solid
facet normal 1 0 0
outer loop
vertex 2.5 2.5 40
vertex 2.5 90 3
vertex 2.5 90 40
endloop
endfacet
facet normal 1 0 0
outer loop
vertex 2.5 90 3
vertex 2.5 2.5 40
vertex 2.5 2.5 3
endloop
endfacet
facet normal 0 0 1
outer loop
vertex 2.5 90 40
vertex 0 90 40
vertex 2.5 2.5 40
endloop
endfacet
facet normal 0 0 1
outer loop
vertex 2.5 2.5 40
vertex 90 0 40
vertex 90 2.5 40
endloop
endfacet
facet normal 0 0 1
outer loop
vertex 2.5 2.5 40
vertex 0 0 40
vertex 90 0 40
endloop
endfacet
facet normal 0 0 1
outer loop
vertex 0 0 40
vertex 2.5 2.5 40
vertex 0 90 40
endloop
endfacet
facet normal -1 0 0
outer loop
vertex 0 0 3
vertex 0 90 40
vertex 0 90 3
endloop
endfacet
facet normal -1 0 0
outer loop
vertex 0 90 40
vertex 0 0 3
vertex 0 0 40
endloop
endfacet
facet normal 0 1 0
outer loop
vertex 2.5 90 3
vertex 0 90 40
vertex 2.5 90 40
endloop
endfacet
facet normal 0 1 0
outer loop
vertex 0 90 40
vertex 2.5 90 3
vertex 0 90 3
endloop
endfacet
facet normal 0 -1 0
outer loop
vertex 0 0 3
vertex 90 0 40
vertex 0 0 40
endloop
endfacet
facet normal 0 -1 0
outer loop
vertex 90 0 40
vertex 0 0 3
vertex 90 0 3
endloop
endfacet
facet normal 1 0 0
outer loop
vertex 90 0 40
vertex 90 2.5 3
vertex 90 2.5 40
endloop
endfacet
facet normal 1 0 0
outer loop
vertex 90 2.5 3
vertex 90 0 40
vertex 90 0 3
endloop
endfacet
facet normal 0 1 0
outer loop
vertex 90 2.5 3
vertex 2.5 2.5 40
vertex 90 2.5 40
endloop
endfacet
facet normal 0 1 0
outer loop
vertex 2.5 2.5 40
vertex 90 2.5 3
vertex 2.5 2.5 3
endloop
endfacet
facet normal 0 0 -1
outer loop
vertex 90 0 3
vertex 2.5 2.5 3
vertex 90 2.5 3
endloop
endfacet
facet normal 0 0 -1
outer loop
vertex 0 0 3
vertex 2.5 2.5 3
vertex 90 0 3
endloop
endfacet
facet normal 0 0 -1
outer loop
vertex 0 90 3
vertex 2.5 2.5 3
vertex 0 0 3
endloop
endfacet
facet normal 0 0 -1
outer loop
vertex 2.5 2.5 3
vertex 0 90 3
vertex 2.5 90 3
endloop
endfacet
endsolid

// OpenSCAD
// Fan box - a top plate and four walls, open at the top, to house a PC case fan as a
// magnetic stirrer. NOVEL general part.
//

top     = 90;
length  = 90;
height  = 40;
wall    = 2.5;
screw   = 4.5;
cable   = 12;

$fn = 48;

plate_t = 2;

difference() {
    union() {
        cube([top, length, plate_t]);                                              // top plate
        for (x = [-top / 2 - wall / 2, top / 2 + wall / 2])
            cube([wall, length, height], p = [x, 0, 0]);                           // left/right walls
        for (y = [-length / 2 - wall / 2, length / 2 + wall / 2])
            cube([top, wall, height], p = [0, y, 0]);                              // front/back walls
    }
    translate([0, 0, -1]) cube([top, length, plate_t + 2]);                        // pocket the fan through the plate
    for (x = [-71.5 / 2 / 2, 71.5 / 2 / 2], y = [-71.5 / 2 / 2, 71.5 / 2 / 2])
        translate([x, y, -1]) cylinder(h = plate_t + 2, d = screw);                 // screw holes
    // cable notch in the +y wall (right wall), centre d, reaching 8 mm down from the open edge
    translate([top / 2 - cable / 2, length / 2 - wall / 2, height - 8])
        cube([cable, wall + 1, 8]);
}
